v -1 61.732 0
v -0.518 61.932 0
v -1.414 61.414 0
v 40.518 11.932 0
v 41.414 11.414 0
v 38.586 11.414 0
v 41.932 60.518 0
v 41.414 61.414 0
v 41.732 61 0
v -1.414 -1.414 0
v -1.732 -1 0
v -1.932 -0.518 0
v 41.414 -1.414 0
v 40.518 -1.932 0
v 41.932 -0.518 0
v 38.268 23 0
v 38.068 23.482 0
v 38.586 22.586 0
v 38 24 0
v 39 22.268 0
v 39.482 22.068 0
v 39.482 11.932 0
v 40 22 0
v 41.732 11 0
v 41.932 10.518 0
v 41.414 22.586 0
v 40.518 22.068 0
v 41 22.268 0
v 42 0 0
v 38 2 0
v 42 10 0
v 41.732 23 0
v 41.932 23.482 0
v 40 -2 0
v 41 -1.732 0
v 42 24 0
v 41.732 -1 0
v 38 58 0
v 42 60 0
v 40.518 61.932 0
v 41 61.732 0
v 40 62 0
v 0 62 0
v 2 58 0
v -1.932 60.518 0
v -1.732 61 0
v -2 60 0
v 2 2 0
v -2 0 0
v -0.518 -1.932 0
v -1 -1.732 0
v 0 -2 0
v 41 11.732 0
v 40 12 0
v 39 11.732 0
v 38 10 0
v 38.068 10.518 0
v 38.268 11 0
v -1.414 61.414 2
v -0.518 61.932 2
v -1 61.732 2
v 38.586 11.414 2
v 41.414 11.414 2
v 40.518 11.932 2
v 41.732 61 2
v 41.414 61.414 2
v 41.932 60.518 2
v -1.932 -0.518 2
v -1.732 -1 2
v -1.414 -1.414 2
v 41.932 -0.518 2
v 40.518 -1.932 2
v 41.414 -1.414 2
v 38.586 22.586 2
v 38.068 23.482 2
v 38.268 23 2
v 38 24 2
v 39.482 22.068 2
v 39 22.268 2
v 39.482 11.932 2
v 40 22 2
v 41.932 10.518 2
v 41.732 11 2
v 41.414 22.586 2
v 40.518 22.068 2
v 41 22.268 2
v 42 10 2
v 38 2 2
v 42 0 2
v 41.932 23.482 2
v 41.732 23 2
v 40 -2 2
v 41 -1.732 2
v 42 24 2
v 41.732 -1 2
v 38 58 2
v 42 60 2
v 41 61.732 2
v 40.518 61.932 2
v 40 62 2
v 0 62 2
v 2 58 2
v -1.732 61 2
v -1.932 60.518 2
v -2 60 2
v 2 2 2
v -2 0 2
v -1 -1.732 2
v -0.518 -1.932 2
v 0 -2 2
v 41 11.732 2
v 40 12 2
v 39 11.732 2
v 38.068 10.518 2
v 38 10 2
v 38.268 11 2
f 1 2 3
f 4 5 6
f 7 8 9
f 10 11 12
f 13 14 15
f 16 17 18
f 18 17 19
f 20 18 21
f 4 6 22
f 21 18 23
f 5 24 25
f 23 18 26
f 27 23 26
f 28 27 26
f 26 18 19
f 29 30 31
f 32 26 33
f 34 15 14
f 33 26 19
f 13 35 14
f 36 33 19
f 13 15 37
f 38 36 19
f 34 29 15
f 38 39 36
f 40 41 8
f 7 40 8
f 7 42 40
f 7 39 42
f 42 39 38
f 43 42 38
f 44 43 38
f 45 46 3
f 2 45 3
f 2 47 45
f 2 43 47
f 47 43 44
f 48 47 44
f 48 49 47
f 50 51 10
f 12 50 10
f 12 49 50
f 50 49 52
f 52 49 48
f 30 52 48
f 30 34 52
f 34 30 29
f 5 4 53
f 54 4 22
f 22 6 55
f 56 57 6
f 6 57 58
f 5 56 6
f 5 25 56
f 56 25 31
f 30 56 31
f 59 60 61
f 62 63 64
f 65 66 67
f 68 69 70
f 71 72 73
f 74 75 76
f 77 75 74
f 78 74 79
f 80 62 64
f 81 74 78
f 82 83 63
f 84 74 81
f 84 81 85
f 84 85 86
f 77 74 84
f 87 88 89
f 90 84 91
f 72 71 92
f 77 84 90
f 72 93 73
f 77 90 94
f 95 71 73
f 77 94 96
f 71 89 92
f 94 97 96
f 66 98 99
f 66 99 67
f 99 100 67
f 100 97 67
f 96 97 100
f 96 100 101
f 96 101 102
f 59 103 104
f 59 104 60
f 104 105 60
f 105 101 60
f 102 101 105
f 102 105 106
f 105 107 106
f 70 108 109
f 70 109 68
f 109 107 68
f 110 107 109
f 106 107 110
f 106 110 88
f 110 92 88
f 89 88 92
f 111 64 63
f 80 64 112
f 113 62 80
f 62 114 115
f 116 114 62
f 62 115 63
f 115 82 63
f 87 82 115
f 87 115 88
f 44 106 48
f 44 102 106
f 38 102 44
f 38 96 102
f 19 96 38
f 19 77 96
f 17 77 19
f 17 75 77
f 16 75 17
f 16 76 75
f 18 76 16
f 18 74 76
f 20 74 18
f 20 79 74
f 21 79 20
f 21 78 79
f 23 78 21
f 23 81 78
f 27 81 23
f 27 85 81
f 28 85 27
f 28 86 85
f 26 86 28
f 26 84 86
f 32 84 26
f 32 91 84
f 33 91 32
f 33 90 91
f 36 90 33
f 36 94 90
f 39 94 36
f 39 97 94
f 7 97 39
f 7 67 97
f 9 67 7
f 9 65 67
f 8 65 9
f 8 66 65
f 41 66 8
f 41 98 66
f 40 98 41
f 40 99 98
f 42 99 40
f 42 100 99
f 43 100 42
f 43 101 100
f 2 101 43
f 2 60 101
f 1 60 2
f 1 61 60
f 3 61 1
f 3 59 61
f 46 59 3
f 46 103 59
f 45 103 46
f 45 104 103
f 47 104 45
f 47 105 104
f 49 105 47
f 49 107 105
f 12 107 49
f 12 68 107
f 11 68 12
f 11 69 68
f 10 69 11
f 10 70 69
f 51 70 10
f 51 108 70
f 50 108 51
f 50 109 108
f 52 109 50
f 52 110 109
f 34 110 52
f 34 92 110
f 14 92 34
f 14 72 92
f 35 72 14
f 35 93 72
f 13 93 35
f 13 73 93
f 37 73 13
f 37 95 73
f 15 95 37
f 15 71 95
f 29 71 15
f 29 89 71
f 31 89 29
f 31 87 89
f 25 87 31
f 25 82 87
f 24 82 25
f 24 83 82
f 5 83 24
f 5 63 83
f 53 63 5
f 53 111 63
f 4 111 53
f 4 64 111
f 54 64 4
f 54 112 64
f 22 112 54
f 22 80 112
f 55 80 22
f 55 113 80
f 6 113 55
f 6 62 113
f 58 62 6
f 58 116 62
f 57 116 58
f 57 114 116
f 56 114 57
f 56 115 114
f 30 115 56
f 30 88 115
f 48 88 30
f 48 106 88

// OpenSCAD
// chain
// @author Ilya Protasov

/*
TODO
- rounded path
- chain loop
*/

/* [Chain link] */
//sizes length and width without link thick (outer width will be more with thick)
link_length = 60;
link_width = 40;
link_thick = 4;
link_height = 2;
gap_align = "start";// [start, center]
gap_width = 14;
gap_start = 10;

/* [Chain] */
//link_count = 1;

/* [Quality ] */
//count of segments in arcs https://en.wikibooks.org/wiki/OpenSCAD_User_Manual/Other_Language_Features#$fa,_$fs_and_$fn
$fn = 24;

module chainLink2d() {
    circle(d=link_thick);
    translate([link_width, 0])
        circle(d=link_thick);
    translate([link_width, link_length])
        circle(d=link_thick);
    translate([0, link_length])
        circle(d=link_thick);
    // borders
    // bottom
    translate([0, -link_thick / 2])
        square([link_width, link_thick]);
    // top
    translate([0, link_length - link_thick / 2])
        square([link_width, link_thick]);
    // left
    translate([-link_thick / 2, 0])
        square([link_thick, link_length]);
    // === gaped border
    gapStart = (gap_align == "start") ? gap_start :
        (link_length - gap_width) / 2;
    afterGap = link_length - gap_width - gapStart;

    // before gap
    translate([link_width - link_thick / 2, 0])
        square([link_thick, gapStart]);

    translate([link_width, gapStart])
        circle(d=link_thick);
    // after gap
    translate([link_width - link_thick / 2, link_length - afterGap])
        square([link_thick, afterGap]);
    translate([link_width, link_length - afterGap])
        circle(d=link_thick);
    //polygon(pointsNotch);
}

module chainLink() {
    linear_extrude(link_height)
        chainLink2d();
}

//%color("Magenta") square([link_width, link_length]);
//projection()
chainLink();
